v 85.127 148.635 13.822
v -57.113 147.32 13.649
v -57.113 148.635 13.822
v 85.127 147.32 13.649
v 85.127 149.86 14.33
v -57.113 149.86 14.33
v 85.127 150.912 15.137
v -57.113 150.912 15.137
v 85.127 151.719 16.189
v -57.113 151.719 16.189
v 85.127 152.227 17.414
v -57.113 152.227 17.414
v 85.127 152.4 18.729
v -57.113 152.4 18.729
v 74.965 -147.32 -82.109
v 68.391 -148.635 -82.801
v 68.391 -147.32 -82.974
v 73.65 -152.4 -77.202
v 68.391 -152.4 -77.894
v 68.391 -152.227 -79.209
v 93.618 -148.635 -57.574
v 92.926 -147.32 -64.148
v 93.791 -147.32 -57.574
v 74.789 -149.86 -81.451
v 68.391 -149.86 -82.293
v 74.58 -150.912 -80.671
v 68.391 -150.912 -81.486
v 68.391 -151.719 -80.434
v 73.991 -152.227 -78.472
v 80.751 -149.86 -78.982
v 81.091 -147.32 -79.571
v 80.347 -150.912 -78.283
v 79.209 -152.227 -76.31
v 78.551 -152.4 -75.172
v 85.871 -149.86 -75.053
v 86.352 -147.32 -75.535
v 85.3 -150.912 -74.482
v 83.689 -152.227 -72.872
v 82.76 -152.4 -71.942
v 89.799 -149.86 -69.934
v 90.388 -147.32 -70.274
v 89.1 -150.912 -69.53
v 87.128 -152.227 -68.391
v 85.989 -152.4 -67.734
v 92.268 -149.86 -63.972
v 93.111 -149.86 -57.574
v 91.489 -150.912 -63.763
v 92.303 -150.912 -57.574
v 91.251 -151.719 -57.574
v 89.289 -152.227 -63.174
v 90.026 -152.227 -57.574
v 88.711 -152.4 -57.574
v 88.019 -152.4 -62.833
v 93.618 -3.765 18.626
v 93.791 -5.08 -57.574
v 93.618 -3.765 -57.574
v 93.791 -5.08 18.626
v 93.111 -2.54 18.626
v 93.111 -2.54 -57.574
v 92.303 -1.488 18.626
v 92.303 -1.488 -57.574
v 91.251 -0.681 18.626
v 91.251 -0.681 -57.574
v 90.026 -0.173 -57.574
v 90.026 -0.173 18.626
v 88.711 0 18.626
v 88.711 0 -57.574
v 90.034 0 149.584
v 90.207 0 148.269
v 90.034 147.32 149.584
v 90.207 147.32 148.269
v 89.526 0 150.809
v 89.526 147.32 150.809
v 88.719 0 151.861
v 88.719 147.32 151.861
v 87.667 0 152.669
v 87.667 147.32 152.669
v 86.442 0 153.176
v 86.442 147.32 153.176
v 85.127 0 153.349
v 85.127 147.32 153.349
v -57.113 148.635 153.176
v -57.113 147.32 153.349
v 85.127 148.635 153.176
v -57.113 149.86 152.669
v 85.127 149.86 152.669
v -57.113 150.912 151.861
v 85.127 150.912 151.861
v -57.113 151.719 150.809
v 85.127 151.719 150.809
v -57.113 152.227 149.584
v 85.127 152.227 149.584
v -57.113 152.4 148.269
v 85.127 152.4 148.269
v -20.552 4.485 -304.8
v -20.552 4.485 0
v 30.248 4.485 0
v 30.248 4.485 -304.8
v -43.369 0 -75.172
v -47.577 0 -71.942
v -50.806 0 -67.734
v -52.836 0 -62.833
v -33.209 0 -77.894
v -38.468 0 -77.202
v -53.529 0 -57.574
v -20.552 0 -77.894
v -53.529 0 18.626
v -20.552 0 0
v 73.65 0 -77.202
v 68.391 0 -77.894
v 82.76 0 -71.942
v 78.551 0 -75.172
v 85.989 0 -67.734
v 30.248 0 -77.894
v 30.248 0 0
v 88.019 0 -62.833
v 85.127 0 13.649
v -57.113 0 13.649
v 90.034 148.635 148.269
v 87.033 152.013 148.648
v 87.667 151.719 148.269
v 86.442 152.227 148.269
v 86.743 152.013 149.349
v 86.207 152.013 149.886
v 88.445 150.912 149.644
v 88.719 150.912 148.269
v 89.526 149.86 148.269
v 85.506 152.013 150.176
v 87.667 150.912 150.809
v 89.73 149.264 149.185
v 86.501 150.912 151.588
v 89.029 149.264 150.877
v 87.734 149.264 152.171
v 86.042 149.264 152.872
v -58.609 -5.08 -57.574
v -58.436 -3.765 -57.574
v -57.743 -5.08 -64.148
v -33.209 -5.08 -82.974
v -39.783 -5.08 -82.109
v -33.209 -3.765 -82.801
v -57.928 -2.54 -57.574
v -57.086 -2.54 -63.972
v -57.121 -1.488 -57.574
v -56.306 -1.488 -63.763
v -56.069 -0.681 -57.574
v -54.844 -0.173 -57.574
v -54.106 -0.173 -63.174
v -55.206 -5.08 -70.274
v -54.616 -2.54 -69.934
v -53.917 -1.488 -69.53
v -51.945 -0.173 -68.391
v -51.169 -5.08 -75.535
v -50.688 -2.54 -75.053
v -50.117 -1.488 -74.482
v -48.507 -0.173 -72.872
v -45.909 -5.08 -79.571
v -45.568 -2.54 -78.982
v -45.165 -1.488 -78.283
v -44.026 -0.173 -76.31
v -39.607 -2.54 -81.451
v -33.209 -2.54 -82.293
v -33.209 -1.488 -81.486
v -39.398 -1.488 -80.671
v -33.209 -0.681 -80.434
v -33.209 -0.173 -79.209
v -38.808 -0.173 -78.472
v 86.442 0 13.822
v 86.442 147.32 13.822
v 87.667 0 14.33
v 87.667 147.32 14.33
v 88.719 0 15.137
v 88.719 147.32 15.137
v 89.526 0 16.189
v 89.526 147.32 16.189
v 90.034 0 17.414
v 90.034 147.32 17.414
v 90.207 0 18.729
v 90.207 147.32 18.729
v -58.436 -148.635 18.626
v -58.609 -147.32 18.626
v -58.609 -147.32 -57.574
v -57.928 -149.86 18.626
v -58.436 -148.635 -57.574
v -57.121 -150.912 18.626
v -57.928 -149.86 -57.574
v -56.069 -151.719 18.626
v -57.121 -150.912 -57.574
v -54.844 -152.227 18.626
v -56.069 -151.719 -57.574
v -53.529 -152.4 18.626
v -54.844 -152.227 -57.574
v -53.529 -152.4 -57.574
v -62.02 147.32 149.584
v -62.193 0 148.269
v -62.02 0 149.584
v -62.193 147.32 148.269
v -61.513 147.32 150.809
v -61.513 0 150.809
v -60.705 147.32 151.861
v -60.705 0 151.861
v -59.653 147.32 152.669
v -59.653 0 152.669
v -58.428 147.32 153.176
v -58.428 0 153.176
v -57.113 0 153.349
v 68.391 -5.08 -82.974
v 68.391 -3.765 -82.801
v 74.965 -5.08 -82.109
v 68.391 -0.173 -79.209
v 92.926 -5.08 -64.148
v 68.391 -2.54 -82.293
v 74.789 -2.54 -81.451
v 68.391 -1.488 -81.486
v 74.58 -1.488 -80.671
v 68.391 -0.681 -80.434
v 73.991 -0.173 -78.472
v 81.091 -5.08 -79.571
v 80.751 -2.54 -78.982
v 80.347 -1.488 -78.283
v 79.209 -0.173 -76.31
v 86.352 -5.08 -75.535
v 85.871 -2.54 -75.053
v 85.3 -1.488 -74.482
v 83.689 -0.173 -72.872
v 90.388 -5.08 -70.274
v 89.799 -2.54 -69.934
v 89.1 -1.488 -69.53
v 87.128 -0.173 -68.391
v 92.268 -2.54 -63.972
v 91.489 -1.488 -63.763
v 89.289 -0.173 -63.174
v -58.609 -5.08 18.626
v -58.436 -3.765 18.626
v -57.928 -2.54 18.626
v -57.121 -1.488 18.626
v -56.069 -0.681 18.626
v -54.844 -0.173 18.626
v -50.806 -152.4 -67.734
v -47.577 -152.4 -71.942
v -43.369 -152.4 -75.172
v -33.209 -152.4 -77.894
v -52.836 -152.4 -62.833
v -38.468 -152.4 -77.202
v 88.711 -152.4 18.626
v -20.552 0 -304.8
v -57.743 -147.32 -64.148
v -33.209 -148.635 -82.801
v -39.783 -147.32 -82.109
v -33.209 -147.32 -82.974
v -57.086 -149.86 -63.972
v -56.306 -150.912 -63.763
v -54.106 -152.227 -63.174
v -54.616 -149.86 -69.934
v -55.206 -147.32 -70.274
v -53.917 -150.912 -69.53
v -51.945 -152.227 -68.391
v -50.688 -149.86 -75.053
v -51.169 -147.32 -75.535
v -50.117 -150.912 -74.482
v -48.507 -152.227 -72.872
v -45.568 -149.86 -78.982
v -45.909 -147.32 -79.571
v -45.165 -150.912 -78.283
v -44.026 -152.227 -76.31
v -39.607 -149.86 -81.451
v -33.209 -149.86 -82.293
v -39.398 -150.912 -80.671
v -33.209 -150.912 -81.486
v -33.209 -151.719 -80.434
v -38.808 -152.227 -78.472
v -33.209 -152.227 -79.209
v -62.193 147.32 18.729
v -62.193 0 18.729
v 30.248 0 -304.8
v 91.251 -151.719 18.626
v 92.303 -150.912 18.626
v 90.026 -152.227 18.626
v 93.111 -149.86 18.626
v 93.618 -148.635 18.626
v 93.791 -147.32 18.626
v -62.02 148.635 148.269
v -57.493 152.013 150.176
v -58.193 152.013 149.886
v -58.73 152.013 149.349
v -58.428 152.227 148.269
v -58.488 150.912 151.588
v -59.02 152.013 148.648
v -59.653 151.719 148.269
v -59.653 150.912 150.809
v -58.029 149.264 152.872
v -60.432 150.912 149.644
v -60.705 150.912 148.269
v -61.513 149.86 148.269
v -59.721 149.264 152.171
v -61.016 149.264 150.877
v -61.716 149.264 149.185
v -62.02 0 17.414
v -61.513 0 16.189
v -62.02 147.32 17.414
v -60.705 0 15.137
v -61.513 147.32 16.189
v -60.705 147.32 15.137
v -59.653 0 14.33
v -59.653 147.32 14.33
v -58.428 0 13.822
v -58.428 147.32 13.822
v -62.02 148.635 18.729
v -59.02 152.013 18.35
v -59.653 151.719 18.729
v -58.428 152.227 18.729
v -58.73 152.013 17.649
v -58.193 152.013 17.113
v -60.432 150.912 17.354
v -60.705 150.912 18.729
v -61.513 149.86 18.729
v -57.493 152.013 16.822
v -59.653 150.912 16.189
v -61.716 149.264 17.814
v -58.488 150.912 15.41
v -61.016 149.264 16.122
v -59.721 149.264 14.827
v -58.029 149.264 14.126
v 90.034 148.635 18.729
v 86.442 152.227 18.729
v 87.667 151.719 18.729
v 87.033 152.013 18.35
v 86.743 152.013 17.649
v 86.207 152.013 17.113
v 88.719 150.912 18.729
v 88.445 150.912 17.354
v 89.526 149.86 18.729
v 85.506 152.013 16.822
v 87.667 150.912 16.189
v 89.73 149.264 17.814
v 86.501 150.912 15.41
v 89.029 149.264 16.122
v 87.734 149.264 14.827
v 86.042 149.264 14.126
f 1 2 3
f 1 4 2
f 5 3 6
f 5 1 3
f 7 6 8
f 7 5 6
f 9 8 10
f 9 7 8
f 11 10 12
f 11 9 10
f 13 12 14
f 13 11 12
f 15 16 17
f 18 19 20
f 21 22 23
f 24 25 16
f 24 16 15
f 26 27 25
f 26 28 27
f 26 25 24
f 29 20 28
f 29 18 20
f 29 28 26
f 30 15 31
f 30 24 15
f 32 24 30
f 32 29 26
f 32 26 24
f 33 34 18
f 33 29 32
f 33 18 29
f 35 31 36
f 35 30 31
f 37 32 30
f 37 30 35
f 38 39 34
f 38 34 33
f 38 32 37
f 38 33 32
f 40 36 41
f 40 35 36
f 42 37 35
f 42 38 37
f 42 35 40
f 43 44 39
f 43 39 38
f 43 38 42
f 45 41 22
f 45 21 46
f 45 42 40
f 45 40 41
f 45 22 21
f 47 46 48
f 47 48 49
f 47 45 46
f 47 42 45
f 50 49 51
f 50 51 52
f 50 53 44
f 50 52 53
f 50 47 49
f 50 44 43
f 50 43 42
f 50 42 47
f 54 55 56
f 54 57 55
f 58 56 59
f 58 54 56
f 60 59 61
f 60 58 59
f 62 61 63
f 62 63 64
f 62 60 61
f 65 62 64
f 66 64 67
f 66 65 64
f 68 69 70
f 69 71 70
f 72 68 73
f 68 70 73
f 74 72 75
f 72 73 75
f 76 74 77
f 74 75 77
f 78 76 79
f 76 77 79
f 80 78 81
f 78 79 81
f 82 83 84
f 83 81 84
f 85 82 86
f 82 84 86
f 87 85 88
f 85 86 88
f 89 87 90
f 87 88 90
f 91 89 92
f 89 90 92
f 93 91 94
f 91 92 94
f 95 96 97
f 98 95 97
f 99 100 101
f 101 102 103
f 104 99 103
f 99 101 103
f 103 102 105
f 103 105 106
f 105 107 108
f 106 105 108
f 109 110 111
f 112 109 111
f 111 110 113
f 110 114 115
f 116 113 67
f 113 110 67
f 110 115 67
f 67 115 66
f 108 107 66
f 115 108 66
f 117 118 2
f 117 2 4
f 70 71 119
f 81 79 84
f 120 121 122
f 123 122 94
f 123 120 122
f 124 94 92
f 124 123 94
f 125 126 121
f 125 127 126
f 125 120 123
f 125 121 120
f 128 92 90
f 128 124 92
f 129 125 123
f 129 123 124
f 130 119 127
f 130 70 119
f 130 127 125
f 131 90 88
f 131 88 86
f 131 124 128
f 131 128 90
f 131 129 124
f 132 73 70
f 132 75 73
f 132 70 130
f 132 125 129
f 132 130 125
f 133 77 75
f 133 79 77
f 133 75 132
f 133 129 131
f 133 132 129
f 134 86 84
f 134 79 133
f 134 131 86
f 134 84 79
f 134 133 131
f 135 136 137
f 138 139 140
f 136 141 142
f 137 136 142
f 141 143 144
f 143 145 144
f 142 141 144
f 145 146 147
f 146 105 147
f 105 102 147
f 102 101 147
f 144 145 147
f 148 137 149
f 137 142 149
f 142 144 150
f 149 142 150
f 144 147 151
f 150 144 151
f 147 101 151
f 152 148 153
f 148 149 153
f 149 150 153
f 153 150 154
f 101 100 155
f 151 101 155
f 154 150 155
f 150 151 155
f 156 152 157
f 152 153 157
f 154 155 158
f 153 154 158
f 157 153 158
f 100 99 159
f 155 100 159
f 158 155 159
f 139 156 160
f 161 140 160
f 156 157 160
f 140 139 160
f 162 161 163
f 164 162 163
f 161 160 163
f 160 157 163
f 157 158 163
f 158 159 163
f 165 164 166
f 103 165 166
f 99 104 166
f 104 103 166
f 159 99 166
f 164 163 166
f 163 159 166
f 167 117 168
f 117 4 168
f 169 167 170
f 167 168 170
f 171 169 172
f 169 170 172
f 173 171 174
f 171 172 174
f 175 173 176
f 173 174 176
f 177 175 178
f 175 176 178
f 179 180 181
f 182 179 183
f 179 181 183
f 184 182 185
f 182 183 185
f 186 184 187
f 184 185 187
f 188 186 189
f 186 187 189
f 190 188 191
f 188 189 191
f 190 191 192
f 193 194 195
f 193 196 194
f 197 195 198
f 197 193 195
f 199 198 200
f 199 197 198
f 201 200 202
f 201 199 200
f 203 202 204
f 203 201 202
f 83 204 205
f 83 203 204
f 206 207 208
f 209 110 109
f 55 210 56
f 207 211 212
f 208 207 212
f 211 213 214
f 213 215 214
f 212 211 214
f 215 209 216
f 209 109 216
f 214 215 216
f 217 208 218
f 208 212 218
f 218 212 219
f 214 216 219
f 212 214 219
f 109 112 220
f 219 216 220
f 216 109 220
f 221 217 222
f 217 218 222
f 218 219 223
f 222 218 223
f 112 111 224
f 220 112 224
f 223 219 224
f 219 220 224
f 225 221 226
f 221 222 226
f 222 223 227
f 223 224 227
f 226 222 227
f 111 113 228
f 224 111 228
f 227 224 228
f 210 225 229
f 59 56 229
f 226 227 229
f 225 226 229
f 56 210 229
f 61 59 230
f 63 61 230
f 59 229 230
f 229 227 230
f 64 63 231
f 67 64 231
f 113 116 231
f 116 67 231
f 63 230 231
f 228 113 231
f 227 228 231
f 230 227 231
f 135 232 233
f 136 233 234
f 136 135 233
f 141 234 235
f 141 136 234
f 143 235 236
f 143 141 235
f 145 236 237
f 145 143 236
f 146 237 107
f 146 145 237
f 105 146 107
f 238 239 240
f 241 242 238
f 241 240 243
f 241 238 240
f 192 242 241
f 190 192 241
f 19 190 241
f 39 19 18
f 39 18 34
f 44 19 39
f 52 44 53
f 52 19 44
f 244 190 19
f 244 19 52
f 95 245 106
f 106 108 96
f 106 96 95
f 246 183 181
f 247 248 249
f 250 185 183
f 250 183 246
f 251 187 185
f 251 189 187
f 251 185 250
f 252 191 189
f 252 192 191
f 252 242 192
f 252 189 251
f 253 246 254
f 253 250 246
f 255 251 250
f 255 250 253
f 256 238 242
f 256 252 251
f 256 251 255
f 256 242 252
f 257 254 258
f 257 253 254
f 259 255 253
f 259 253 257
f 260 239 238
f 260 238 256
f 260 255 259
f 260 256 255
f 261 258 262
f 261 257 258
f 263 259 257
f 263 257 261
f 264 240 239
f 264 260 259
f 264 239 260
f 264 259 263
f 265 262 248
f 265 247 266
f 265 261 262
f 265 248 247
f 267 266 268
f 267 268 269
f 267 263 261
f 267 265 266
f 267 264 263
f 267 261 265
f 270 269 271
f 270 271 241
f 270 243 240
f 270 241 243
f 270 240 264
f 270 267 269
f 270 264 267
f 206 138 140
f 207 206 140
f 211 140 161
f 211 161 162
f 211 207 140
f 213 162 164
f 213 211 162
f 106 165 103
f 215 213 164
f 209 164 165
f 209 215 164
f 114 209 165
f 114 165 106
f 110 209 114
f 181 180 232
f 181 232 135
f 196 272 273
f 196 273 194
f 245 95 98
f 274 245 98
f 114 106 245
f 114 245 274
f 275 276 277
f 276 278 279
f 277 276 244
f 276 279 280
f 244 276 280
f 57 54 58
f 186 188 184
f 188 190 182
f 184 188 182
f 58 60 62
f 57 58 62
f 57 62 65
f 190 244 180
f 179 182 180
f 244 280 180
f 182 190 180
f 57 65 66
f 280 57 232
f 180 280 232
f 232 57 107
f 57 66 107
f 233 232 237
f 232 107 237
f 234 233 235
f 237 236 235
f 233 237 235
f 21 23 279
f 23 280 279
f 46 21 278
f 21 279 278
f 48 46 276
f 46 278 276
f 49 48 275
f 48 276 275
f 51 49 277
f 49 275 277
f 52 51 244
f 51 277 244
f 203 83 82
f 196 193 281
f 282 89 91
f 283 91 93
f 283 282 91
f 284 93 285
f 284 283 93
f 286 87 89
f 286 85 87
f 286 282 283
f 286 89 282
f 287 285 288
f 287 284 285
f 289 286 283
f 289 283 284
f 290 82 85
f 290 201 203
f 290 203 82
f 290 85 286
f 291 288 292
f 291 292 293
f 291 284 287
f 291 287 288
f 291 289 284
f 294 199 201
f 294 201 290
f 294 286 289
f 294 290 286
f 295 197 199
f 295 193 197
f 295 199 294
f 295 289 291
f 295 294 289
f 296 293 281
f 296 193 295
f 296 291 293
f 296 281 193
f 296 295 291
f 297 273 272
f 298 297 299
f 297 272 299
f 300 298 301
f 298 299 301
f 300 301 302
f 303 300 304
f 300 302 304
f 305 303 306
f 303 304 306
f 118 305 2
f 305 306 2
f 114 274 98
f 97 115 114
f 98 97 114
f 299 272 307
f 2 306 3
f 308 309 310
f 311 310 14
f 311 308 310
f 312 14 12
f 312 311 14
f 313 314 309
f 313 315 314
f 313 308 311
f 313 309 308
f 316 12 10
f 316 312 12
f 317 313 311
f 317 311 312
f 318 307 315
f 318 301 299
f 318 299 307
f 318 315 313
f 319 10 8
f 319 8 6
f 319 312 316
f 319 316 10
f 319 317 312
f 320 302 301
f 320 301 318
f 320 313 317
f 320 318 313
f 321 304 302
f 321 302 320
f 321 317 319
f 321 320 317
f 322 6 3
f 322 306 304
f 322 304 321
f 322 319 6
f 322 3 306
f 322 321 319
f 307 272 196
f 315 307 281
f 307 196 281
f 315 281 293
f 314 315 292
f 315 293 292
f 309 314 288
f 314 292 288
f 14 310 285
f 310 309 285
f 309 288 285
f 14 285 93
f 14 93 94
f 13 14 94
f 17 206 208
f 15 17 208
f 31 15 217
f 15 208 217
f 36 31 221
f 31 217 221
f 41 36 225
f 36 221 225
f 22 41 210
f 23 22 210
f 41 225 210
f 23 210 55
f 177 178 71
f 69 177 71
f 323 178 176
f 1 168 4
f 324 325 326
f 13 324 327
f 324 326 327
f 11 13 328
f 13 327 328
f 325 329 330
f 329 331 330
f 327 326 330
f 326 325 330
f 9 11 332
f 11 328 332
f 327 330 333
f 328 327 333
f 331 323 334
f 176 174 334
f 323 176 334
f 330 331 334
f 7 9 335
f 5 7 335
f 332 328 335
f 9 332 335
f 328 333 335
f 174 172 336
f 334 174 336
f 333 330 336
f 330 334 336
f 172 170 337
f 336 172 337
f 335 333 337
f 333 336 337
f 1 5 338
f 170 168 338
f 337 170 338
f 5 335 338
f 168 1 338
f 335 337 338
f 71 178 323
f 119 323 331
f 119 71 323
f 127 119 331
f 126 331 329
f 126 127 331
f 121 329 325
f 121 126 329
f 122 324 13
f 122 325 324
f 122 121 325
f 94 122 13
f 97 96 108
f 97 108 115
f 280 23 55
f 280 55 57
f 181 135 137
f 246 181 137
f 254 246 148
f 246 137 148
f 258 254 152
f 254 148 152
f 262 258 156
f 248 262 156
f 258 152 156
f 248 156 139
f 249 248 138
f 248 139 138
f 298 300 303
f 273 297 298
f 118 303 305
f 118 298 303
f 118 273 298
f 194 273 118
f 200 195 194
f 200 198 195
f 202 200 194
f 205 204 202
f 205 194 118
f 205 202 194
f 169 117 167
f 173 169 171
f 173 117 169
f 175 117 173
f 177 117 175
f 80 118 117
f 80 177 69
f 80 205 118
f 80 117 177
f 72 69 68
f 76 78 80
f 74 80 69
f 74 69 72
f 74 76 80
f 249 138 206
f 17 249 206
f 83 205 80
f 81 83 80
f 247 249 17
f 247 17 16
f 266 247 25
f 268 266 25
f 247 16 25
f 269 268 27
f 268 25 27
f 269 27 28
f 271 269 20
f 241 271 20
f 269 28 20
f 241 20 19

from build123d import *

# Parameters (mm, degrees)
F1_DEPTH = 152.4
F2_R     = 5.08
F3_W     = 152.4
F3_H     = 139.7
F4_DEPTH = 152.4
F5_R     = 5.08
F6_W     = 50.8
F6_H     = 4.4845114427
F7_DEPTH = 304.8


with BuildPart() as f1:
    # F0 (on Front) → F1 (new body)
    with BuildSketch(Plane.XZ):
        with BuildLine():
            Line((93.791274333, 18.625925827), (-58.608725667, 18.625925827))
            Line((-58.608725667, 18.625925827), (-58.608725667, -57.574074173))
            ThreePointArc((-58.608725667, -57.574074173), (-51.1692379091, -75.5345864151), (-33.208725667, -82.974074173))
            Line((-33.208725667, -82.974074173), (68.391274333, -82.974074173))
            ThreePointArc((68.391274333, -82.974074173), (86.3517865751, -75.5345864151), (93.791274333, -57.574074173))
            Line((93.791274333, -57.574074173), (93.791274333, 18.625925827))
        make_face()
    extrude(amount=F1_DEPTH)

    # F2
    f2_edges = [f1.edges().sort_by_distance(p)[0] for p in [
        (93.791274, -152.4, -19.474074),
        (93.791274, 0, -19.474074),
    ]]
    fillet(f2_edges, radius=F2_R)

    # F6 (on Top) → F7 (join)
    with BuildSketch(Plane.XY):
        with Locations((4.8482243842, 2.2422557214)):
            Rectangle(F6_W, F6_H)
    extrude(amount=-F7_DEPTH)


with BuildPart() as f4:
    # F3 (on Front) → F4 (new body)
    with BuildSketch(Plane.XZ):
        with Locations((14.006703535, 83.4991298616)):
            Rectangle(F3_W, F3_H)
    extrude(amount=-F4_DEPTH)

    # F5
    f5_edges = [f4.edges().sort_by_distance(p)[0] for p in [
        (90.206704, 76.2, 153.34913),
        (90.206704, 76.2, 13.64913),
        (90.206704, 152.4, 83.49913),
        (-62.193296, 76.2, 153.34913),
        (14.006704, 152.4, 153.34913),
        (-62.193296, 76.2, 13.64913),
        (-62.193296, 152.4, 83.49913),
        (14.006704, 152.4, 13.64913),
    ]]
    fillet(f5_edges, radius=F5_R)


solid = Compound([f1.part, f4.part])
